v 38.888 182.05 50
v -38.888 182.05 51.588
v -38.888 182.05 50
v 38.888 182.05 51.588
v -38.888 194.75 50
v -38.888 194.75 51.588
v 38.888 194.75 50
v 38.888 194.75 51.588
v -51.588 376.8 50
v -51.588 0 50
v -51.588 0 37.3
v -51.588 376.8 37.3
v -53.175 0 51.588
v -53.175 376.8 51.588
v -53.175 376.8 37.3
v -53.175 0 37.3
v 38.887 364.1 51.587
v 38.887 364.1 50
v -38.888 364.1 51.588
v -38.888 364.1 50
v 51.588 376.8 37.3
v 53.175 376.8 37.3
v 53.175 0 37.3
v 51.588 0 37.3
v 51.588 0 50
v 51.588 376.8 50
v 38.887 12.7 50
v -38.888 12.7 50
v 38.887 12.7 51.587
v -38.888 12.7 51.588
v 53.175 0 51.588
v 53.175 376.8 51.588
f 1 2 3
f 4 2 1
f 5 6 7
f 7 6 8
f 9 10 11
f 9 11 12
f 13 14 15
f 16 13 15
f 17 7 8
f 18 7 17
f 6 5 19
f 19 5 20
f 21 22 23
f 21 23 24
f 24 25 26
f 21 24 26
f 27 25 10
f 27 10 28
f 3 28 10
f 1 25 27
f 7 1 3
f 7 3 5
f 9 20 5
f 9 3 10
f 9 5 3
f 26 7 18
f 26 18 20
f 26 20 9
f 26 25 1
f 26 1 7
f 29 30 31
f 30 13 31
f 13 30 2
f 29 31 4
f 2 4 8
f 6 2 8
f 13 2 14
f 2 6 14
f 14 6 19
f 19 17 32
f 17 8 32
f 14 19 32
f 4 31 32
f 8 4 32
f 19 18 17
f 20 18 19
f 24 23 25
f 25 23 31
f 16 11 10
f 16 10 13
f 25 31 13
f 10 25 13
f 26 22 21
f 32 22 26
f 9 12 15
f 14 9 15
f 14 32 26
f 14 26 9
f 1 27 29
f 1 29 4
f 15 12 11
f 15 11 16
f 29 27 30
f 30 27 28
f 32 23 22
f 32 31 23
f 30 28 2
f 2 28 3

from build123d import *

# Parameters (mm, degrees)
SKETCH1_W                      = 103.175
SKETCH1_H                      = 103.175
SKETCH1_W_2                    = 100
SKETCH1_H_2                    = 100
BULKSHELLEXTRUDE_DEPTH         = 376.8
SKETCH14_W                     = 77.775
SKETCH14_H                     = 351.4
SIDEWALLCUT_DEPTH              = 103.1875
SIDEWALLCUTPATTERN_COUNT       = 4
SKETCH20_W                     = 77.775
SKETCH20_H                     = 12.7
CENTERSUPPORT_DEPTH            = 1.5875
CENTERSUPPORTPATTERNCIRC_COUNT = 4
SKETCH22_W                     = 100
SKETCH22_H                     = 376.8
CUT_EXTRUDE4_DEPTH             = 103.1875
SKETCH23_W                     = 1.5875
SKETCH23_H                     = 376.8
BOSS_EXTRUDE1_DEPTH            = 1.5875
SKETCH24_W                     = 1.5875
SKETCH24_H                     = 376.8
BOSS_EXTRUDE2_DEPTH            = 12.7


with BuildPart() as part:
    # Sketch1 → BulkShellExtrude (new body)
    with BuildSketch(Plane(origin=(0, 0, 0), x_dir=(1, 0, 0), z_dir=(0, 1, 0))):
        Rectangle(SKETCH1_W, SKETCH1_H)
        Rectangle(SKETCH1_W_2, SKETCH1_H_2, mode=Mode.SUBTRACT)
    extrude(amount=BULKSHELLEXTRUDE_DEPTH)

    # Sketch14 → SideWallCut (cut)
    with BuildSketch(Plane(origin=(51.5875, 0, 0), x_dir=(0, 0, -1), z_dir=(1, 0, 0))):
        with Locations((0, 188.4)):
            Rectangle(SKETCH14_W, SKETCH14_H)
    sidewallcut = extrude(amount=-SIDEWALLCUT_DEPTH, mode=Mode.SUBTRACT)

    # SideWallCutPattern: SideWallCut ×4 about axis
    sidewallcutpattern_axis = Axis((0, 0, 0), (0, 1, 0))
    for i in range(1, SIDEWALLCUTPATTERN_COUNT):
        add(sidewallcut.rotate(sidewallcutpattern_axis, i * 360 / SIDEWALLCUTPATTERN_COUNT), mode=Mode.SUBTRACT)

    # Sketch20 → CenterSupport (add)
    with BuildSketch(Plane.XY.offset(51.5875)):
        with Locations((0, 188.4)):
            Rectangle(SKETCH20_W, SKETCH20_H)
    centersupport = extrude(amount=-CENTERSUPPORT_DEPTH)

    # CenterSupportPatternCirc: CenterSupport ×4 about axis
    centersupportpatterncirc_axis = Axis((0, 0, 0), (0, 1, 0))
    for i in range(1, CENTERSUPPORTPATTERNCIRC_COUNT):
        add(centersupport.rotate(centersupportpatterncirc_axis, i * 360 / CENTERSUPPORTPATTERNCIRC_COUNT))

    # Sketch22 → Cut-Extrude4 (cut)
    with BuildSketch(Plane(origin=(51.5875, 0, 0), x_dir=(0, 0, -1), z_dir=(1, 0, 0))):
        with Locations((0, 188.4)):
            Rectangle(SKETCH22_W, SKETCH22_H)
    extrude(amount=-CUT_EXTRUDE4_DEPTH, mode=Mode.SUBTRACT)


with BuildPart() as body_2:
    # of the pieces the cut leaves, the one that is kept (cut_extrude4_keep)
    add(part.part.solids().sort_by_distance((51.5875, 0, 51.5875))[0])

    # Sketch23 → Boss-Extrude1 (add)
    with BuildSketch(Plane(origin=(51.5875, 0, 0), x_dir=(0, 0, -1), z_dir=(1, 0, 0))):
        with Locations((-50.79375, 188.4)):
            Rectangle(SKETCH23_W, SKETCH23_H)
    boss_extrude1 = extrude(amount=BOSS_EXTRUDE1_DEPTH)

    # Mirror1: Boss-Extrude1 across plane
    add(boss_extrude1.mirror(Plane(origin=(0, 0, 0), x_dir=(0, 0, 1), z_dir=(1, 0, 0))))

    # Sketch24 → Boss-Extrude2 (add)
    with BuildSketch(Plane(origin=(0, 0, 50), x_dir=(-1, 0, 0), z_dir=(0, 0, -1))):
        with Locations((-52.38125, 188.4)):
            Rectangle(SKETCH24_W, SKETCH24_H)
        with Locations((52.38125, 188.4)):
            Rectangle(SKETCH24_W, SKETCH24_H)
    extrude(amount=BOSS_EXTRUDE2_DEPTH)


solid = body_2.part
